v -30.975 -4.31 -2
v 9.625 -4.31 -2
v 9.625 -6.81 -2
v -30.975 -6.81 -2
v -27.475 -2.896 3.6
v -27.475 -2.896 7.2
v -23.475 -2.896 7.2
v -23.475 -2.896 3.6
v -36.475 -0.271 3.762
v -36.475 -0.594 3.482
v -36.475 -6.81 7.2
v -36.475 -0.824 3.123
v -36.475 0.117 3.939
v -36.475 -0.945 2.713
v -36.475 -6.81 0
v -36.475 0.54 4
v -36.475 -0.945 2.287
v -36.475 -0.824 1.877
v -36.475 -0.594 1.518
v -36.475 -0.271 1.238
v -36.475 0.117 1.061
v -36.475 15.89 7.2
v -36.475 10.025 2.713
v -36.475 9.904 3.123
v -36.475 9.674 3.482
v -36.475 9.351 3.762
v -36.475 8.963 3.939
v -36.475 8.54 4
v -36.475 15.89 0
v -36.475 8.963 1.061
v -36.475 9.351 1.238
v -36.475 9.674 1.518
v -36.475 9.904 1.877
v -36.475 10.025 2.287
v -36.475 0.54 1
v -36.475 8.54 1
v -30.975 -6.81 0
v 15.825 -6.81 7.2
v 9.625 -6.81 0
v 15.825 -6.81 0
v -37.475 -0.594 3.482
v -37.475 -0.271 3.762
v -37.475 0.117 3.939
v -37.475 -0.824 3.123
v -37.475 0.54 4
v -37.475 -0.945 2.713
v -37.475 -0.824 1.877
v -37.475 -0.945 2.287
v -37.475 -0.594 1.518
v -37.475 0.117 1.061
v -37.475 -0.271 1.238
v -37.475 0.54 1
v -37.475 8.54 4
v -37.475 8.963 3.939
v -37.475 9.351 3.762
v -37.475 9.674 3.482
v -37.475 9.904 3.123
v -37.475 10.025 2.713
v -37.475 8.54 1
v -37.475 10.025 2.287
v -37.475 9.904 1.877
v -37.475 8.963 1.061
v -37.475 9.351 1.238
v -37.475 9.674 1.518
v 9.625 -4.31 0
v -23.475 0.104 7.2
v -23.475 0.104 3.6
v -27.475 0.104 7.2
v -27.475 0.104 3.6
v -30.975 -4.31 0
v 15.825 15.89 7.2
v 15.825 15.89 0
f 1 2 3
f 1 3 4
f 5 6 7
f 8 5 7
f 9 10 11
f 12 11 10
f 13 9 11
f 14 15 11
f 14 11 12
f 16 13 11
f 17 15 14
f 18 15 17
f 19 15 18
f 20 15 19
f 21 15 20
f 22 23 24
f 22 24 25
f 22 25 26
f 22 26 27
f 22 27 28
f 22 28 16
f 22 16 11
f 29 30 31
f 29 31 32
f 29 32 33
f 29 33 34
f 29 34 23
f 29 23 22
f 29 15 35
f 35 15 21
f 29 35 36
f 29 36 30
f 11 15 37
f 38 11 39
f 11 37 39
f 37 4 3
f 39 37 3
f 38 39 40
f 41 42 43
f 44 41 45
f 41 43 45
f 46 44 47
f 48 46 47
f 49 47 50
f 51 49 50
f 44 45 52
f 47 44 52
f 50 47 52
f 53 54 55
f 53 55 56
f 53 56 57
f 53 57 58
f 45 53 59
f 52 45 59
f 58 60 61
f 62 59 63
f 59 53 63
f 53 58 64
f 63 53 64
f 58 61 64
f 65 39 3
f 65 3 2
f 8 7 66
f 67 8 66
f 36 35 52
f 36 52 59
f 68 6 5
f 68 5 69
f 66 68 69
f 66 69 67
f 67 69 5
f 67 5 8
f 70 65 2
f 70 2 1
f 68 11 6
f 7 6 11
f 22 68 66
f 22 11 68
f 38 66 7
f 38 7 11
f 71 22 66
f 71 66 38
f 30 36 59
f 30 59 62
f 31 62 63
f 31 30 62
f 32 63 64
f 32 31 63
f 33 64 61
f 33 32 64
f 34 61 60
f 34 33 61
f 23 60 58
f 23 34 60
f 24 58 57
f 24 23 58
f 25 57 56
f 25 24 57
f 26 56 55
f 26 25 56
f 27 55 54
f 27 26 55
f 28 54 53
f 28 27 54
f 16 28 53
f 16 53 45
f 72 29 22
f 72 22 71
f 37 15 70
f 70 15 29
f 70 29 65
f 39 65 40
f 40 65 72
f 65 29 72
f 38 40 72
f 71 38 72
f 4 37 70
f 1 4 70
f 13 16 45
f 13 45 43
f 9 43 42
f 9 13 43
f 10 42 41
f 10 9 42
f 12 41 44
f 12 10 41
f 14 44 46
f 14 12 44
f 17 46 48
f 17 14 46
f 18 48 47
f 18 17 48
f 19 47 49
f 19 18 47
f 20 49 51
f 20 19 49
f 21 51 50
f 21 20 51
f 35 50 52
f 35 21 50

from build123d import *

# Parameters (mm, degrees)
SKETCH_1_W          = 52.3
SKETCH_1_H          = 22.7
EXTRUDE_1_DEPTH     = 7.2
SKETCH_2_W          = 40.6
SKETCH_2_H          = 2.5
EXTRUDE_2_DEPTH     = 2
EXTRUDE_3_DEPTH     = 1
SKETCH_9_W          = 4
SKETCH_9_H          = 3
CUT_EXTRUDE_1_DEPTH = 3.6


with BuildPart() as part:
    # 草图1 → 凸台-拉伸1 (new body)
    with BuildSketch(Plane.XY):
        with Locations((-10.324857143, 4.54)):
            Rectangle(SKETCH_1_W, SKETCH_1_H)
    extrude(amount=EXTRUDE_1_DEPTH)

    # 草图2 → 凸台-拉伸2 (add)
    with BuildSketch(Plane(origin=(0, 0, 0), x_dir=(-1, 0, 0), z_dir=(0, 0, -1))):
        with Locations((10.674857143, -5.56)):
            Rectangle(SKETCH_2_W, SKETCH_2_H)
    extrude(amount=EXTRUDE_2_DEPTH)

    # 草图5 → 凸台-拉伸3 (add)
    with BuildSketch(Plane.ZY.offset(36.474857143)):
        with BuildLine():
            Line((4, 8.54), (4, 0.54))
            ThreePointArc((4, 0.54), (2.5, -0.96), (1, 0.54))
            Line((1, 0.54), (1, 8.54))
            ThreePointArc((1, 8.54), (2.5, 10.04), (4, 8.54))
        make_face()
    extrude(amount=EXTRUDE_3_DEPTH)

    # 草图9 → 切除-拉伸1 (cut)
    with BuildSketch(Plane.XY.offset(7.2)):
        with Locations((-25.474857143, -1.396404092)):
            Rectangle(SKETCH_9_W, SKETCH_9_H)
    extrude(amount=-CUT_EXTRUDE_1_DEPTH, mode=Mode.SUBTRACT)


solid = part.part
